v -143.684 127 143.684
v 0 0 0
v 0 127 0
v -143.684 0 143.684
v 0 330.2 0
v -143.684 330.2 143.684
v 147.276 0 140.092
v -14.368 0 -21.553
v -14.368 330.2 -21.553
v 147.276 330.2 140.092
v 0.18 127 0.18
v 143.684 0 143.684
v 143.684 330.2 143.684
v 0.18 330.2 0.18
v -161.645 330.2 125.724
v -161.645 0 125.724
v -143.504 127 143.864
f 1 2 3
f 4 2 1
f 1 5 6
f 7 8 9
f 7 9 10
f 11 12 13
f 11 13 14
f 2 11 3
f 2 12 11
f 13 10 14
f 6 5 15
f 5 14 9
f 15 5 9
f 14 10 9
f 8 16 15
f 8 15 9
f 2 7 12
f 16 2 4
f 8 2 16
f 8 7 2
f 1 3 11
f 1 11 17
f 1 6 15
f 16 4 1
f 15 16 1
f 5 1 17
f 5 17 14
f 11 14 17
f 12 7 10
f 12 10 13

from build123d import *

# Parameters (mm, degrees)
BOSS_EXTRUDE1_DEPTH = 330.2
BOSS_EXTRUDE2_DEPTH = 0.254


with BuildPart() as part:
    # Sketch1 → Boss-Extrude1 (new body)
    with BuildSketch(Plane(origin=(0, 0, 0), x_dir=(1, 0, 0), z_dir=(0, 1, 0))):
        Polygon((0, 0), (-143.684097937, -143.684097937), (-161.644610179, -125.723585695), (-14.368409794, 21.552614691), (147.276200386, -140.091995489), (143.684097937, -143.684097937), align=None)
    extrude(amount=BOSS_EXTRUDE1_DEPTH)

    # Sketch2 → Boss-Extrude2 (add)
    with BuildSketch(Plane(origin=(0, 0, 0), x_dir=(0.707106781, 0, -0.707106781), z_dir=(0.707106781, 0, 0.707106781))):
        Polygon((0, 330.2), (0, 127), (-203.2, 127), align=None)
    extrude(amount=BOSS_EXTRUDE2_DEPTH)


solid = part.part
